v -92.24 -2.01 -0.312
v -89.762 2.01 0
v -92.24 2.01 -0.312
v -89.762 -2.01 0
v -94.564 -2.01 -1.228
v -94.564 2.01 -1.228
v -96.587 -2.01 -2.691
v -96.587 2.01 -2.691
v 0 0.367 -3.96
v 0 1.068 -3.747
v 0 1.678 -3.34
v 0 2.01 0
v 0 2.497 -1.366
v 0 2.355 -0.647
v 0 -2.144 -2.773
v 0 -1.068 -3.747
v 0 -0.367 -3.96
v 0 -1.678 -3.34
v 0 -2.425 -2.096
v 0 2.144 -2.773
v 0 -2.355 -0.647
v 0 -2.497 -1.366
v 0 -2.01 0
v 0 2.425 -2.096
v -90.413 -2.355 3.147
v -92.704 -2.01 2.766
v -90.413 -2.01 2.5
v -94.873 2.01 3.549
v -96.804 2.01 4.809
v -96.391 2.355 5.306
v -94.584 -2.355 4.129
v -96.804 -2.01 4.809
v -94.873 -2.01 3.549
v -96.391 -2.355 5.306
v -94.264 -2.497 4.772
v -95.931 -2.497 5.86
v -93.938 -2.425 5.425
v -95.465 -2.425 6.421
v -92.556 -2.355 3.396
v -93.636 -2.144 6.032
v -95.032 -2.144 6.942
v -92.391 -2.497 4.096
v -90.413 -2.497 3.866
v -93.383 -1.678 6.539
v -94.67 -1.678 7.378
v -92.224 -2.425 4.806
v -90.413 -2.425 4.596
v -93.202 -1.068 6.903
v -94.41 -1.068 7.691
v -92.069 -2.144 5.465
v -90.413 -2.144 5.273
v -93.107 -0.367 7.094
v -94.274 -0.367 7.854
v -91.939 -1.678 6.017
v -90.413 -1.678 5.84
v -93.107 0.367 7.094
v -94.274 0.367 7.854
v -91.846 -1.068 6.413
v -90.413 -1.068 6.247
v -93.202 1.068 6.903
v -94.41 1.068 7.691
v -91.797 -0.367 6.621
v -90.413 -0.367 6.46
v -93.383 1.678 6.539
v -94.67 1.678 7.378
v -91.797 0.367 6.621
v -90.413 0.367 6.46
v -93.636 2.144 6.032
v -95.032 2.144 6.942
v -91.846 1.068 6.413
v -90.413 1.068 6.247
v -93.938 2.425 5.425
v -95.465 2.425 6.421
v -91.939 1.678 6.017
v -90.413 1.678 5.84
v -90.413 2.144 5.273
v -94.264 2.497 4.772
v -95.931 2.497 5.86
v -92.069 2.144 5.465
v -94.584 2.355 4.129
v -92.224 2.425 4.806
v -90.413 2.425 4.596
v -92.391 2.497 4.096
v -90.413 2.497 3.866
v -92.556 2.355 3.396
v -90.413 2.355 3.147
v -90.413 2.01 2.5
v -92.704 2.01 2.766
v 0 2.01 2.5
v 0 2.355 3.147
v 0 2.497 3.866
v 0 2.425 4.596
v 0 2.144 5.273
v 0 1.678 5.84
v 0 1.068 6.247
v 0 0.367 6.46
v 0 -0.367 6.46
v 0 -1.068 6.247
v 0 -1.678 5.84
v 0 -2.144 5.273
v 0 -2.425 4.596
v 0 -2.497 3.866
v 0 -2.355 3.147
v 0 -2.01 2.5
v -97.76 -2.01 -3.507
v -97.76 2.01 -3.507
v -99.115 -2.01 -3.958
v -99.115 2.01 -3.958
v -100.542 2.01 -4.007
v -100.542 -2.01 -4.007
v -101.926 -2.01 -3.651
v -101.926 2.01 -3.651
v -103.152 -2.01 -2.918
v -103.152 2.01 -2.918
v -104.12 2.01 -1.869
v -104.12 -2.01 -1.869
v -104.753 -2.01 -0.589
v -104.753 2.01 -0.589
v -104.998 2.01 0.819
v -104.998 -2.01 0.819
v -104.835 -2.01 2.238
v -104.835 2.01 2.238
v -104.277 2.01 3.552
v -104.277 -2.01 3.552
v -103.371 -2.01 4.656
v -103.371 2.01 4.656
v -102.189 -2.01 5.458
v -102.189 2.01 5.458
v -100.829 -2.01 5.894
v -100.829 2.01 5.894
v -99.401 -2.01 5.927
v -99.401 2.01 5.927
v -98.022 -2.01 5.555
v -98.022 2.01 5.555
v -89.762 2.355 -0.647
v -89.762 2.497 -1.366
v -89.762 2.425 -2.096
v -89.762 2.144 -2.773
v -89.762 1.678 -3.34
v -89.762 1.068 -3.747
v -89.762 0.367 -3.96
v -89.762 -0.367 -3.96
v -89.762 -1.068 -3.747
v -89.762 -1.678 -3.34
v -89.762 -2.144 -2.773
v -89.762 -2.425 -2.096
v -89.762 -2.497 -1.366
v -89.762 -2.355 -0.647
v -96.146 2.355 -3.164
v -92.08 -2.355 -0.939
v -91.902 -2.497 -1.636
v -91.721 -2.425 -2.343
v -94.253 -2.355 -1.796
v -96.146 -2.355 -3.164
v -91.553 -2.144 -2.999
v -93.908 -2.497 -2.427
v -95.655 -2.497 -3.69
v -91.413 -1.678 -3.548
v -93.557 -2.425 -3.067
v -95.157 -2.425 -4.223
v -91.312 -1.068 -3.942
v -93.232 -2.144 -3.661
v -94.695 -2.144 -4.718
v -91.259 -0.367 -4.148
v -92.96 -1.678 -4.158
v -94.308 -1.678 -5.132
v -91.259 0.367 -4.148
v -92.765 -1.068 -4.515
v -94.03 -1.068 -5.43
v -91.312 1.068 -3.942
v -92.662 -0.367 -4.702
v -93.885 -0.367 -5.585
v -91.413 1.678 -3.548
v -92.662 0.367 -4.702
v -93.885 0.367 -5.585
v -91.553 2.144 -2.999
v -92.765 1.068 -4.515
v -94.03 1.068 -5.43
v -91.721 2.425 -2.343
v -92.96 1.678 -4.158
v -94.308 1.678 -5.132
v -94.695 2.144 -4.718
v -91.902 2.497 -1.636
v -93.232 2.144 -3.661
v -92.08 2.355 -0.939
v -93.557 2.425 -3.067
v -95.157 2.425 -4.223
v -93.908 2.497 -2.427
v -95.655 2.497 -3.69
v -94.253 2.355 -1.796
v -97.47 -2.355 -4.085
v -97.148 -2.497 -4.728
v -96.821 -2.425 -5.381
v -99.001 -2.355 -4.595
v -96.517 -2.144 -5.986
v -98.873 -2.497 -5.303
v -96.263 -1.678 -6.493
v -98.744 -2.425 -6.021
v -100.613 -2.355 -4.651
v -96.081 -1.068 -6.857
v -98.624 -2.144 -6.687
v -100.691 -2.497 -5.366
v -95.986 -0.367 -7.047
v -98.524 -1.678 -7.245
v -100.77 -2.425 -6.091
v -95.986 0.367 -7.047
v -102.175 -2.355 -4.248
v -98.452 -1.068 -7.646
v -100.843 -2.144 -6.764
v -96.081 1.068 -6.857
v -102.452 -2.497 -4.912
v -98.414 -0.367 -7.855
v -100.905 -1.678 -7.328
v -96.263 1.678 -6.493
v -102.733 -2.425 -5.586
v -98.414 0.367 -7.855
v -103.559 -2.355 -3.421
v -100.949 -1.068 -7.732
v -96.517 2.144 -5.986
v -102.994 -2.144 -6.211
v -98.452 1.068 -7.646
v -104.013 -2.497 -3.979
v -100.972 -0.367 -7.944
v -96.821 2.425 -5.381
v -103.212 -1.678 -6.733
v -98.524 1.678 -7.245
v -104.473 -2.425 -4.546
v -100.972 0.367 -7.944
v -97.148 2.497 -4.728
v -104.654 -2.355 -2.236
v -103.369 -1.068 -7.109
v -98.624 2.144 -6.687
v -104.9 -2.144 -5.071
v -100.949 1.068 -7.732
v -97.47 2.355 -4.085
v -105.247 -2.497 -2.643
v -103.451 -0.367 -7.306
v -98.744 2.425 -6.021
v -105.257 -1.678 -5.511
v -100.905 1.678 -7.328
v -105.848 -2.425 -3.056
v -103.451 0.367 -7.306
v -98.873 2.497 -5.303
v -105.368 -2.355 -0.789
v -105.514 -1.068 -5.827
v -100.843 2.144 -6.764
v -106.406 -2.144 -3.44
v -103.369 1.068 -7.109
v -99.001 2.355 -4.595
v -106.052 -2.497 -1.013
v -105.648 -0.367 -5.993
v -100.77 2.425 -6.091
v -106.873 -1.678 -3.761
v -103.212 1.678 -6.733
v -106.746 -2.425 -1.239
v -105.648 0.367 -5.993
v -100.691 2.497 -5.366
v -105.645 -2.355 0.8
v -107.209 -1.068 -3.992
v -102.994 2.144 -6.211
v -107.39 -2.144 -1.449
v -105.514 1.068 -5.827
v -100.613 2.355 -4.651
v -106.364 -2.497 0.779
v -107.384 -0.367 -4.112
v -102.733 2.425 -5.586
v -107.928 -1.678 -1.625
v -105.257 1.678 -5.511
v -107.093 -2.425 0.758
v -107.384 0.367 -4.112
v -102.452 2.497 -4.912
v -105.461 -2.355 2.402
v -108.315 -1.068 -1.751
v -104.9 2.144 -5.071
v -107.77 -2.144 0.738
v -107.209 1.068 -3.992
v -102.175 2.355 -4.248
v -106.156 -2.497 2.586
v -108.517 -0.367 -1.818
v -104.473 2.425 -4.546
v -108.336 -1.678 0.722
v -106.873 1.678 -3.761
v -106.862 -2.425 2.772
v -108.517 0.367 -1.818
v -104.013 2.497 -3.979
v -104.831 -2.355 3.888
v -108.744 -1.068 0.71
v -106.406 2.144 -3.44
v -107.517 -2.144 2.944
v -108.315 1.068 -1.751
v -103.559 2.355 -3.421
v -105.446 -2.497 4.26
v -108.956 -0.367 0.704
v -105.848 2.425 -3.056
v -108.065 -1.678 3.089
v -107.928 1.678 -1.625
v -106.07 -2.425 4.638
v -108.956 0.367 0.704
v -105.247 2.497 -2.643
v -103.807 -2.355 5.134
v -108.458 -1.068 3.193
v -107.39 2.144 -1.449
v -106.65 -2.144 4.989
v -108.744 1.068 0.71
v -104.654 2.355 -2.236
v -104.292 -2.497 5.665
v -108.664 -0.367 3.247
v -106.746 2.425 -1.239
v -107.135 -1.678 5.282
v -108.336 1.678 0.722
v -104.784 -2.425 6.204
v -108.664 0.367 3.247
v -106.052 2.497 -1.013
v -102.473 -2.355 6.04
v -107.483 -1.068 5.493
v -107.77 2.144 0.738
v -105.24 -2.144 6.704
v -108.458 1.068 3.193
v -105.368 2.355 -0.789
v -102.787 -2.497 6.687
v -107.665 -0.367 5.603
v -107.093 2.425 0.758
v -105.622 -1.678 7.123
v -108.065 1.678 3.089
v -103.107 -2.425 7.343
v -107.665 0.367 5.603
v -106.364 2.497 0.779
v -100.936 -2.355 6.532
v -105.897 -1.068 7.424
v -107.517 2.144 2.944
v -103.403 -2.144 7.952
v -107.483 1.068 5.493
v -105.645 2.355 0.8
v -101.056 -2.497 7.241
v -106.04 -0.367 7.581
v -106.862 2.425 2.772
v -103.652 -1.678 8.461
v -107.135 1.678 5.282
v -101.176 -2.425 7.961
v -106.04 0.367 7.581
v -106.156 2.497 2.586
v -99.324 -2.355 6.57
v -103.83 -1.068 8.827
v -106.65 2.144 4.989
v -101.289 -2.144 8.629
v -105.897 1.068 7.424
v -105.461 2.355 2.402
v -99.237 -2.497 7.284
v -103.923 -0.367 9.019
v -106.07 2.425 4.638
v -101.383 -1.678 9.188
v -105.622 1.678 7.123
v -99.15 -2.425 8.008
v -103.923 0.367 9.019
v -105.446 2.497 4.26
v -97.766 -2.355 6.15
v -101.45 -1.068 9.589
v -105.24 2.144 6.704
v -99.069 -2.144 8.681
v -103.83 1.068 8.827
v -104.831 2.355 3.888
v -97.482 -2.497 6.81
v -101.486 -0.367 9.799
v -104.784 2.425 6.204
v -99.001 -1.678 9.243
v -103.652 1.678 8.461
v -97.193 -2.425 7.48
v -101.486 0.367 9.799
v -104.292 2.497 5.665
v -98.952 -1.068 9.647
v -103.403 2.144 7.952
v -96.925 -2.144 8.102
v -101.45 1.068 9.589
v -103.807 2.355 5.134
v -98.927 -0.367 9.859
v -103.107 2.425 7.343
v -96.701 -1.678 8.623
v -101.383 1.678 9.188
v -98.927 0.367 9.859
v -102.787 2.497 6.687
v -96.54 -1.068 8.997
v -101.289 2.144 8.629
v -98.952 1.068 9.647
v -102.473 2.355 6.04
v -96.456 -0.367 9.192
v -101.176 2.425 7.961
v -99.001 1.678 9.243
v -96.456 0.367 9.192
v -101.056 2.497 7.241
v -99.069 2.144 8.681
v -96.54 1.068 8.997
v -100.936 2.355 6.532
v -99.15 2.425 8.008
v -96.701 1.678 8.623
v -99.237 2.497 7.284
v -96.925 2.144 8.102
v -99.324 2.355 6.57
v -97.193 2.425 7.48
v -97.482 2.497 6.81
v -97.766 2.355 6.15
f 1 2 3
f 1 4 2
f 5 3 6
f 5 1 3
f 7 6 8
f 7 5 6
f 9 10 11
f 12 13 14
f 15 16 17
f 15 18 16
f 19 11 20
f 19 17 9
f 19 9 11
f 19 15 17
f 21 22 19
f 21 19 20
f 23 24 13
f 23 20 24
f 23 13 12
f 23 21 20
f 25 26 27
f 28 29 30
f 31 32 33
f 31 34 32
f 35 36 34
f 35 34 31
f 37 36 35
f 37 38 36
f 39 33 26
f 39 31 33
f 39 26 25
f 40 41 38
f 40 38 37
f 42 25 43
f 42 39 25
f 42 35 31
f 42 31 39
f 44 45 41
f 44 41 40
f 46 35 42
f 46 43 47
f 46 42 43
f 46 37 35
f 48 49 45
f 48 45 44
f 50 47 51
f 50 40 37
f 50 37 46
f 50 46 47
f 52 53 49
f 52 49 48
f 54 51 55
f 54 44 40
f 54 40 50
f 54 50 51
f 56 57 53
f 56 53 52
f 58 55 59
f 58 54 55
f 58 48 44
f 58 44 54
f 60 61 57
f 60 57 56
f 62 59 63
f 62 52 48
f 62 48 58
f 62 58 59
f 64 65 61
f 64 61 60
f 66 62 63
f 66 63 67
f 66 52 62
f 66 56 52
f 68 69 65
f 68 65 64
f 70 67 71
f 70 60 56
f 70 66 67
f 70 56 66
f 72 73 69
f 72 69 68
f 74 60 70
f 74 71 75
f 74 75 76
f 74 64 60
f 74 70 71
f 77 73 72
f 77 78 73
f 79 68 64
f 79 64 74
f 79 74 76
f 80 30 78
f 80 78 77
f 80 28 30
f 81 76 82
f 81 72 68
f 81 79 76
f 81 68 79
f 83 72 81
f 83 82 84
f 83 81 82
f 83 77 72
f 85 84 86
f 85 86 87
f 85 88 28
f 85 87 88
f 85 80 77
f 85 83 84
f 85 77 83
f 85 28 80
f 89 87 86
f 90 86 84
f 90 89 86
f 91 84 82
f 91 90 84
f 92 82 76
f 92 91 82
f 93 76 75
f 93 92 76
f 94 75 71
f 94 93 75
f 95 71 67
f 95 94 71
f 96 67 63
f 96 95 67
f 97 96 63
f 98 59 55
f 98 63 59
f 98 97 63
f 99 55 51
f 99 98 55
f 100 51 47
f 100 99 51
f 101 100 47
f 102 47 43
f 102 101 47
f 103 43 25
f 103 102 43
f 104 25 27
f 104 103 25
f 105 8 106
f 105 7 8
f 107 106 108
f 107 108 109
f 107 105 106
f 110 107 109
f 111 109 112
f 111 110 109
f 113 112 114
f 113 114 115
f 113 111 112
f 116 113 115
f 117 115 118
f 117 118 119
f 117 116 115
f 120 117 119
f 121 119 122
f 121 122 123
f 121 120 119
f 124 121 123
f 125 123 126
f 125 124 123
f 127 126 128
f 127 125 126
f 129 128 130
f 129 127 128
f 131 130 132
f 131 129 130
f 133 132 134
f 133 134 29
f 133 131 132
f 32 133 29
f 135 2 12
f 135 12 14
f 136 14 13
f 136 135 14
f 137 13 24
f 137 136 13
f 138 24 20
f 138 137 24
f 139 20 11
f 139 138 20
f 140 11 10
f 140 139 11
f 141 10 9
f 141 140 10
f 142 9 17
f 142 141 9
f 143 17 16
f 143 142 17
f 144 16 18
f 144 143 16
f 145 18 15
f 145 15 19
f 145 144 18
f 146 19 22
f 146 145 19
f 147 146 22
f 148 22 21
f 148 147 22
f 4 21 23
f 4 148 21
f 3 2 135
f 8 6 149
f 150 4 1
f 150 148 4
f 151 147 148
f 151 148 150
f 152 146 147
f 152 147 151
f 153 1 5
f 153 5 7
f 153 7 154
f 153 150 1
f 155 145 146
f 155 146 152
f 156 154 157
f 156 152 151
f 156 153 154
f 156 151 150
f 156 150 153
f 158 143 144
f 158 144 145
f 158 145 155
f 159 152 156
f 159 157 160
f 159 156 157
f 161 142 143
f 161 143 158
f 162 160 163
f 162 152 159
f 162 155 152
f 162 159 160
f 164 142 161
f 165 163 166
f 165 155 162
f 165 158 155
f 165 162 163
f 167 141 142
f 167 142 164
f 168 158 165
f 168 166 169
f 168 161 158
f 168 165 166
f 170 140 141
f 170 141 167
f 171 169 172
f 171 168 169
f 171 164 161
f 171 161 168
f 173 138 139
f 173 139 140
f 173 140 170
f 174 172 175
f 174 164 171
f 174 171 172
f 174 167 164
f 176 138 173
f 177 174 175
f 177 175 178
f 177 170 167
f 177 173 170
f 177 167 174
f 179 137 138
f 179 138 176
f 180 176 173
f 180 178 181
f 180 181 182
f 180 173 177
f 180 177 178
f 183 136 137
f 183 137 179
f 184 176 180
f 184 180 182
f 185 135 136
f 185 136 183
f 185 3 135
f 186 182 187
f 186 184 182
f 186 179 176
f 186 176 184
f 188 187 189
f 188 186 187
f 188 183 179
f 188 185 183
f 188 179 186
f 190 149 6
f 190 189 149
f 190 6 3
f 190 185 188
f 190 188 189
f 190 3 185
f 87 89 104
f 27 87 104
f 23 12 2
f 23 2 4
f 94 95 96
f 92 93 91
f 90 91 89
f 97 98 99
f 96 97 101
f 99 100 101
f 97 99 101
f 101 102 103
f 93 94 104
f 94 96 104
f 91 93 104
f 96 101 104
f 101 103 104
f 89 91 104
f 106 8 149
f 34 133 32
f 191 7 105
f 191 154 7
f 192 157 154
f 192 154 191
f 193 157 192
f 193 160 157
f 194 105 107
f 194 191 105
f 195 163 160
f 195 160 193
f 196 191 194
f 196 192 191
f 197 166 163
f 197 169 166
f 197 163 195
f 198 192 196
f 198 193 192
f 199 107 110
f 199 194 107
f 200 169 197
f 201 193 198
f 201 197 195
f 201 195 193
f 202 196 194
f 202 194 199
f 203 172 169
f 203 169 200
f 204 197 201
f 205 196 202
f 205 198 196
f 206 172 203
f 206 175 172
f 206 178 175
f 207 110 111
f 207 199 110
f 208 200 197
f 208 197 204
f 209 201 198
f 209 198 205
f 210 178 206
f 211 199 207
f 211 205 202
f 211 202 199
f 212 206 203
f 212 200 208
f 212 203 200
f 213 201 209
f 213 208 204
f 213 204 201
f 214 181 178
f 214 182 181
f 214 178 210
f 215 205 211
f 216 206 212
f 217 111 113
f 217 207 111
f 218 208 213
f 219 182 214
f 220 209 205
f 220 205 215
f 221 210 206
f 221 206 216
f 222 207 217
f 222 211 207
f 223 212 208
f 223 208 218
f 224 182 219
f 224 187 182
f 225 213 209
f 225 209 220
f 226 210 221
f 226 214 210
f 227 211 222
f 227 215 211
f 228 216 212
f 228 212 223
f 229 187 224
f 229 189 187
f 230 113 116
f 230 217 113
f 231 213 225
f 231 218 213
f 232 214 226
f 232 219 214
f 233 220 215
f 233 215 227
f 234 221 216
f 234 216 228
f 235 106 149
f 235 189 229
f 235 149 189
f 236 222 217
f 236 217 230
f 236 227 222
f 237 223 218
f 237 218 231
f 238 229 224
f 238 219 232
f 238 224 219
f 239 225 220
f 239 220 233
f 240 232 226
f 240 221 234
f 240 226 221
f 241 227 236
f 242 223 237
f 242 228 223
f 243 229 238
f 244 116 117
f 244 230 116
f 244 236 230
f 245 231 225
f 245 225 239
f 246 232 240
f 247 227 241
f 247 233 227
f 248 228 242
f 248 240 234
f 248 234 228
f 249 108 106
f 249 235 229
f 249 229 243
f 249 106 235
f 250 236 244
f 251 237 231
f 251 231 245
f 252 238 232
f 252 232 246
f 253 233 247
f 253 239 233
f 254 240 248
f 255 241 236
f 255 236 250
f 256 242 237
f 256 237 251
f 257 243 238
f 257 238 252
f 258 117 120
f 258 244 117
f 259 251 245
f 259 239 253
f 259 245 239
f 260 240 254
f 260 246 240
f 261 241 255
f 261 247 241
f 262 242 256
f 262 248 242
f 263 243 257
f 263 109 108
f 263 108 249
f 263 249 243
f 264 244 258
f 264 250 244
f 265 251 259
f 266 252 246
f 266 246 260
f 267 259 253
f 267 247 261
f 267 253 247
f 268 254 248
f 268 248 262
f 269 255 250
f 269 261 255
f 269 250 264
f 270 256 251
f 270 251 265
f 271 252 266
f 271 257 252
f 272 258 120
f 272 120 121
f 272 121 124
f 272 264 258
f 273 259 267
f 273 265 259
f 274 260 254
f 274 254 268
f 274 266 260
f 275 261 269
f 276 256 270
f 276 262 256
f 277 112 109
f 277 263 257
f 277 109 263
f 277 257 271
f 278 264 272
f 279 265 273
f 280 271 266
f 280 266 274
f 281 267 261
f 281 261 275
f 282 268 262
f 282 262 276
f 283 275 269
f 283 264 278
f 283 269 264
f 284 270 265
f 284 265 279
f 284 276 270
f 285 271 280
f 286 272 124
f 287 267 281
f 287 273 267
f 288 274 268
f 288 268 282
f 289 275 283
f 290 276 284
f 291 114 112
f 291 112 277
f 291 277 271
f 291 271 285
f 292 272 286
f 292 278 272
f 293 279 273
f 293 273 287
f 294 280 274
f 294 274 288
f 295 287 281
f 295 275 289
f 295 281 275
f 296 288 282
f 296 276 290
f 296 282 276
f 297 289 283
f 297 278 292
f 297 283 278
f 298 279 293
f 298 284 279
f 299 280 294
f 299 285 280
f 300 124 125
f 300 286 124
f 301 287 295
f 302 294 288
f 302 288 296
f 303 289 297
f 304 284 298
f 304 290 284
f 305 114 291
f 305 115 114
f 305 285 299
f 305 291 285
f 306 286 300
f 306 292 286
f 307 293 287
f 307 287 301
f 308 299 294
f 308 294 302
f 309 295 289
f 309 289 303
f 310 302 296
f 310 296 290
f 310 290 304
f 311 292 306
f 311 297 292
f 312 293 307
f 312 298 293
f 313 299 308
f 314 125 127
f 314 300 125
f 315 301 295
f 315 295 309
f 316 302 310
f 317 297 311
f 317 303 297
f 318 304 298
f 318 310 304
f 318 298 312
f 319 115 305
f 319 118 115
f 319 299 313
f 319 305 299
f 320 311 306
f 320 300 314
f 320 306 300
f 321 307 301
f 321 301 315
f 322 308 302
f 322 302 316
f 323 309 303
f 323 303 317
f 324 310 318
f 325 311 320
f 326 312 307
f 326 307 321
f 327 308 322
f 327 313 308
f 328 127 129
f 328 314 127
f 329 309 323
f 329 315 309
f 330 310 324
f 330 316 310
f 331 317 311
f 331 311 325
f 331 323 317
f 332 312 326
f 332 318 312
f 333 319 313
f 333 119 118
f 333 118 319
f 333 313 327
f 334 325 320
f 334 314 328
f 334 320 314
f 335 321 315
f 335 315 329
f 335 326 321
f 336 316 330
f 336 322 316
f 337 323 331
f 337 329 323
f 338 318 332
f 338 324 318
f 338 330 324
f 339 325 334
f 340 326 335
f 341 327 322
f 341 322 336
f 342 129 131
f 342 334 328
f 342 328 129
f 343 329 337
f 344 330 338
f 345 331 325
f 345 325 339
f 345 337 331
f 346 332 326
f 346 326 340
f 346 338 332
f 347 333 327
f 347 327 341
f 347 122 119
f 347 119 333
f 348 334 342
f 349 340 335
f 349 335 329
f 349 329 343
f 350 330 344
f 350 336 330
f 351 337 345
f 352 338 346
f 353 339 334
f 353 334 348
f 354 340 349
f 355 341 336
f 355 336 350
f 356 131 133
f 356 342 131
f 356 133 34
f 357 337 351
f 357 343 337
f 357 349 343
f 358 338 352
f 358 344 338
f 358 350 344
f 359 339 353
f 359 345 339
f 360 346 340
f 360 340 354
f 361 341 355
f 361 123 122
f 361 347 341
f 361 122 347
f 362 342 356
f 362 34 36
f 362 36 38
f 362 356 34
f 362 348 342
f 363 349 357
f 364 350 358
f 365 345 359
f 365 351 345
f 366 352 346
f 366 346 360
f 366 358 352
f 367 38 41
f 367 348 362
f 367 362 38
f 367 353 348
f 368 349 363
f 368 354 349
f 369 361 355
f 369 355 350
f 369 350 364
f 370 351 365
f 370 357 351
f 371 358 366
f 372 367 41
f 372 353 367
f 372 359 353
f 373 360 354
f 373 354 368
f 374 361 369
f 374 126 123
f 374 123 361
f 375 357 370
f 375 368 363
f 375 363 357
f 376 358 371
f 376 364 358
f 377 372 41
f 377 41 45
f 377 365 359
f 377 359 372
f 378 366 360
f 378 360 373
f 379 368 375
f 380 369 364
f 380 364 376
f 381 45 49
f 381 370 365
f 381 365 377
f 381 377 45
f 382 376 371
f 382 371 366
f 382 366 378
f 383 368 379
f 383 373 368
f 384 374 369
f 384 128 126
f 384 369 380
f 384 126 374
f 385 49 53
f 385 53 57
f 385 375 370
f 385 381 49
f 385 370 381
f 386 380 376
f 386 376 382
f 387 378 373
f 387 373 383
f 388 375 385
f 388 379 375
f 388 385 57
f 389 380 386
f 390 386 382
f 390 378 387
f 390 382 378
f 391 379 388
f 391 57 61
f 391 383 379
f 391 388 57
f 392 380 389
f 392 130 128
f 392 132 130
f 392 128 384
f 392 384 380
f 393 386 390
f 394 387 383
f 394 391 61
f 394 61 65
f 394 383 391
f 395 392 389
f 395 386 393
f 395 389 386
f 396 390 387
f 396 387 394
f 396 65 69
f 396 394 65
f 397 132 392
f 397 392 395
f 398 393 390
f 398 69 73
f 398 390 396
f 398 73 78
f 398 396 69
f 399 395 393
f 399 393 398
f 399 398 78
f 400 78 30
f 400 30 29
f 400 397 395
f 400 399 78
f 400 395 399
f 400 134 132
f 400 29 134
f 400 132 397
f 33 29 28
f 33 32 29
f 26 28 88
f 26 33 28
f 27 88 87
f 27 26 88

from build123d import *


with BuildPart() as f2:
    # F2: sweep along a path in F0
    with BuildLine(Plane.XZ) as f2_path:
        Line((0, 0), (-89.7624007647, 0))
        ThreePointArc((-89.7624007647, 0), (-93.4306468362, -0.6970987988), (-96.5874669216, -2.6912058481))
        ThreePointArc((-96.5874669216, -2.6912058481), (-104.9979081868, 0.8185753347), (-96.8044815522, 4.8087941519))
        ThreePointArc((-96.8044815522, 4.8087941519), (-93.8110865975, 3.0948934487), (-90.4134446565, 2.5))
        Line((-90.4134446565, 2.5), (0, 2.5))
    # F1 (on Right) → F2 (sweep)
    with BuildSketch(Plane.YZ):
        with BuildLine():
            ThreePointArc((-2.0097258966, 0), (0, -3.9869437852), (2.0097258966, 0))
            Line((2.0097258966, 0), (-2.0097258966, 0))
        make_face()
    sweep(path=f2_path.line)


solid = f2.part
